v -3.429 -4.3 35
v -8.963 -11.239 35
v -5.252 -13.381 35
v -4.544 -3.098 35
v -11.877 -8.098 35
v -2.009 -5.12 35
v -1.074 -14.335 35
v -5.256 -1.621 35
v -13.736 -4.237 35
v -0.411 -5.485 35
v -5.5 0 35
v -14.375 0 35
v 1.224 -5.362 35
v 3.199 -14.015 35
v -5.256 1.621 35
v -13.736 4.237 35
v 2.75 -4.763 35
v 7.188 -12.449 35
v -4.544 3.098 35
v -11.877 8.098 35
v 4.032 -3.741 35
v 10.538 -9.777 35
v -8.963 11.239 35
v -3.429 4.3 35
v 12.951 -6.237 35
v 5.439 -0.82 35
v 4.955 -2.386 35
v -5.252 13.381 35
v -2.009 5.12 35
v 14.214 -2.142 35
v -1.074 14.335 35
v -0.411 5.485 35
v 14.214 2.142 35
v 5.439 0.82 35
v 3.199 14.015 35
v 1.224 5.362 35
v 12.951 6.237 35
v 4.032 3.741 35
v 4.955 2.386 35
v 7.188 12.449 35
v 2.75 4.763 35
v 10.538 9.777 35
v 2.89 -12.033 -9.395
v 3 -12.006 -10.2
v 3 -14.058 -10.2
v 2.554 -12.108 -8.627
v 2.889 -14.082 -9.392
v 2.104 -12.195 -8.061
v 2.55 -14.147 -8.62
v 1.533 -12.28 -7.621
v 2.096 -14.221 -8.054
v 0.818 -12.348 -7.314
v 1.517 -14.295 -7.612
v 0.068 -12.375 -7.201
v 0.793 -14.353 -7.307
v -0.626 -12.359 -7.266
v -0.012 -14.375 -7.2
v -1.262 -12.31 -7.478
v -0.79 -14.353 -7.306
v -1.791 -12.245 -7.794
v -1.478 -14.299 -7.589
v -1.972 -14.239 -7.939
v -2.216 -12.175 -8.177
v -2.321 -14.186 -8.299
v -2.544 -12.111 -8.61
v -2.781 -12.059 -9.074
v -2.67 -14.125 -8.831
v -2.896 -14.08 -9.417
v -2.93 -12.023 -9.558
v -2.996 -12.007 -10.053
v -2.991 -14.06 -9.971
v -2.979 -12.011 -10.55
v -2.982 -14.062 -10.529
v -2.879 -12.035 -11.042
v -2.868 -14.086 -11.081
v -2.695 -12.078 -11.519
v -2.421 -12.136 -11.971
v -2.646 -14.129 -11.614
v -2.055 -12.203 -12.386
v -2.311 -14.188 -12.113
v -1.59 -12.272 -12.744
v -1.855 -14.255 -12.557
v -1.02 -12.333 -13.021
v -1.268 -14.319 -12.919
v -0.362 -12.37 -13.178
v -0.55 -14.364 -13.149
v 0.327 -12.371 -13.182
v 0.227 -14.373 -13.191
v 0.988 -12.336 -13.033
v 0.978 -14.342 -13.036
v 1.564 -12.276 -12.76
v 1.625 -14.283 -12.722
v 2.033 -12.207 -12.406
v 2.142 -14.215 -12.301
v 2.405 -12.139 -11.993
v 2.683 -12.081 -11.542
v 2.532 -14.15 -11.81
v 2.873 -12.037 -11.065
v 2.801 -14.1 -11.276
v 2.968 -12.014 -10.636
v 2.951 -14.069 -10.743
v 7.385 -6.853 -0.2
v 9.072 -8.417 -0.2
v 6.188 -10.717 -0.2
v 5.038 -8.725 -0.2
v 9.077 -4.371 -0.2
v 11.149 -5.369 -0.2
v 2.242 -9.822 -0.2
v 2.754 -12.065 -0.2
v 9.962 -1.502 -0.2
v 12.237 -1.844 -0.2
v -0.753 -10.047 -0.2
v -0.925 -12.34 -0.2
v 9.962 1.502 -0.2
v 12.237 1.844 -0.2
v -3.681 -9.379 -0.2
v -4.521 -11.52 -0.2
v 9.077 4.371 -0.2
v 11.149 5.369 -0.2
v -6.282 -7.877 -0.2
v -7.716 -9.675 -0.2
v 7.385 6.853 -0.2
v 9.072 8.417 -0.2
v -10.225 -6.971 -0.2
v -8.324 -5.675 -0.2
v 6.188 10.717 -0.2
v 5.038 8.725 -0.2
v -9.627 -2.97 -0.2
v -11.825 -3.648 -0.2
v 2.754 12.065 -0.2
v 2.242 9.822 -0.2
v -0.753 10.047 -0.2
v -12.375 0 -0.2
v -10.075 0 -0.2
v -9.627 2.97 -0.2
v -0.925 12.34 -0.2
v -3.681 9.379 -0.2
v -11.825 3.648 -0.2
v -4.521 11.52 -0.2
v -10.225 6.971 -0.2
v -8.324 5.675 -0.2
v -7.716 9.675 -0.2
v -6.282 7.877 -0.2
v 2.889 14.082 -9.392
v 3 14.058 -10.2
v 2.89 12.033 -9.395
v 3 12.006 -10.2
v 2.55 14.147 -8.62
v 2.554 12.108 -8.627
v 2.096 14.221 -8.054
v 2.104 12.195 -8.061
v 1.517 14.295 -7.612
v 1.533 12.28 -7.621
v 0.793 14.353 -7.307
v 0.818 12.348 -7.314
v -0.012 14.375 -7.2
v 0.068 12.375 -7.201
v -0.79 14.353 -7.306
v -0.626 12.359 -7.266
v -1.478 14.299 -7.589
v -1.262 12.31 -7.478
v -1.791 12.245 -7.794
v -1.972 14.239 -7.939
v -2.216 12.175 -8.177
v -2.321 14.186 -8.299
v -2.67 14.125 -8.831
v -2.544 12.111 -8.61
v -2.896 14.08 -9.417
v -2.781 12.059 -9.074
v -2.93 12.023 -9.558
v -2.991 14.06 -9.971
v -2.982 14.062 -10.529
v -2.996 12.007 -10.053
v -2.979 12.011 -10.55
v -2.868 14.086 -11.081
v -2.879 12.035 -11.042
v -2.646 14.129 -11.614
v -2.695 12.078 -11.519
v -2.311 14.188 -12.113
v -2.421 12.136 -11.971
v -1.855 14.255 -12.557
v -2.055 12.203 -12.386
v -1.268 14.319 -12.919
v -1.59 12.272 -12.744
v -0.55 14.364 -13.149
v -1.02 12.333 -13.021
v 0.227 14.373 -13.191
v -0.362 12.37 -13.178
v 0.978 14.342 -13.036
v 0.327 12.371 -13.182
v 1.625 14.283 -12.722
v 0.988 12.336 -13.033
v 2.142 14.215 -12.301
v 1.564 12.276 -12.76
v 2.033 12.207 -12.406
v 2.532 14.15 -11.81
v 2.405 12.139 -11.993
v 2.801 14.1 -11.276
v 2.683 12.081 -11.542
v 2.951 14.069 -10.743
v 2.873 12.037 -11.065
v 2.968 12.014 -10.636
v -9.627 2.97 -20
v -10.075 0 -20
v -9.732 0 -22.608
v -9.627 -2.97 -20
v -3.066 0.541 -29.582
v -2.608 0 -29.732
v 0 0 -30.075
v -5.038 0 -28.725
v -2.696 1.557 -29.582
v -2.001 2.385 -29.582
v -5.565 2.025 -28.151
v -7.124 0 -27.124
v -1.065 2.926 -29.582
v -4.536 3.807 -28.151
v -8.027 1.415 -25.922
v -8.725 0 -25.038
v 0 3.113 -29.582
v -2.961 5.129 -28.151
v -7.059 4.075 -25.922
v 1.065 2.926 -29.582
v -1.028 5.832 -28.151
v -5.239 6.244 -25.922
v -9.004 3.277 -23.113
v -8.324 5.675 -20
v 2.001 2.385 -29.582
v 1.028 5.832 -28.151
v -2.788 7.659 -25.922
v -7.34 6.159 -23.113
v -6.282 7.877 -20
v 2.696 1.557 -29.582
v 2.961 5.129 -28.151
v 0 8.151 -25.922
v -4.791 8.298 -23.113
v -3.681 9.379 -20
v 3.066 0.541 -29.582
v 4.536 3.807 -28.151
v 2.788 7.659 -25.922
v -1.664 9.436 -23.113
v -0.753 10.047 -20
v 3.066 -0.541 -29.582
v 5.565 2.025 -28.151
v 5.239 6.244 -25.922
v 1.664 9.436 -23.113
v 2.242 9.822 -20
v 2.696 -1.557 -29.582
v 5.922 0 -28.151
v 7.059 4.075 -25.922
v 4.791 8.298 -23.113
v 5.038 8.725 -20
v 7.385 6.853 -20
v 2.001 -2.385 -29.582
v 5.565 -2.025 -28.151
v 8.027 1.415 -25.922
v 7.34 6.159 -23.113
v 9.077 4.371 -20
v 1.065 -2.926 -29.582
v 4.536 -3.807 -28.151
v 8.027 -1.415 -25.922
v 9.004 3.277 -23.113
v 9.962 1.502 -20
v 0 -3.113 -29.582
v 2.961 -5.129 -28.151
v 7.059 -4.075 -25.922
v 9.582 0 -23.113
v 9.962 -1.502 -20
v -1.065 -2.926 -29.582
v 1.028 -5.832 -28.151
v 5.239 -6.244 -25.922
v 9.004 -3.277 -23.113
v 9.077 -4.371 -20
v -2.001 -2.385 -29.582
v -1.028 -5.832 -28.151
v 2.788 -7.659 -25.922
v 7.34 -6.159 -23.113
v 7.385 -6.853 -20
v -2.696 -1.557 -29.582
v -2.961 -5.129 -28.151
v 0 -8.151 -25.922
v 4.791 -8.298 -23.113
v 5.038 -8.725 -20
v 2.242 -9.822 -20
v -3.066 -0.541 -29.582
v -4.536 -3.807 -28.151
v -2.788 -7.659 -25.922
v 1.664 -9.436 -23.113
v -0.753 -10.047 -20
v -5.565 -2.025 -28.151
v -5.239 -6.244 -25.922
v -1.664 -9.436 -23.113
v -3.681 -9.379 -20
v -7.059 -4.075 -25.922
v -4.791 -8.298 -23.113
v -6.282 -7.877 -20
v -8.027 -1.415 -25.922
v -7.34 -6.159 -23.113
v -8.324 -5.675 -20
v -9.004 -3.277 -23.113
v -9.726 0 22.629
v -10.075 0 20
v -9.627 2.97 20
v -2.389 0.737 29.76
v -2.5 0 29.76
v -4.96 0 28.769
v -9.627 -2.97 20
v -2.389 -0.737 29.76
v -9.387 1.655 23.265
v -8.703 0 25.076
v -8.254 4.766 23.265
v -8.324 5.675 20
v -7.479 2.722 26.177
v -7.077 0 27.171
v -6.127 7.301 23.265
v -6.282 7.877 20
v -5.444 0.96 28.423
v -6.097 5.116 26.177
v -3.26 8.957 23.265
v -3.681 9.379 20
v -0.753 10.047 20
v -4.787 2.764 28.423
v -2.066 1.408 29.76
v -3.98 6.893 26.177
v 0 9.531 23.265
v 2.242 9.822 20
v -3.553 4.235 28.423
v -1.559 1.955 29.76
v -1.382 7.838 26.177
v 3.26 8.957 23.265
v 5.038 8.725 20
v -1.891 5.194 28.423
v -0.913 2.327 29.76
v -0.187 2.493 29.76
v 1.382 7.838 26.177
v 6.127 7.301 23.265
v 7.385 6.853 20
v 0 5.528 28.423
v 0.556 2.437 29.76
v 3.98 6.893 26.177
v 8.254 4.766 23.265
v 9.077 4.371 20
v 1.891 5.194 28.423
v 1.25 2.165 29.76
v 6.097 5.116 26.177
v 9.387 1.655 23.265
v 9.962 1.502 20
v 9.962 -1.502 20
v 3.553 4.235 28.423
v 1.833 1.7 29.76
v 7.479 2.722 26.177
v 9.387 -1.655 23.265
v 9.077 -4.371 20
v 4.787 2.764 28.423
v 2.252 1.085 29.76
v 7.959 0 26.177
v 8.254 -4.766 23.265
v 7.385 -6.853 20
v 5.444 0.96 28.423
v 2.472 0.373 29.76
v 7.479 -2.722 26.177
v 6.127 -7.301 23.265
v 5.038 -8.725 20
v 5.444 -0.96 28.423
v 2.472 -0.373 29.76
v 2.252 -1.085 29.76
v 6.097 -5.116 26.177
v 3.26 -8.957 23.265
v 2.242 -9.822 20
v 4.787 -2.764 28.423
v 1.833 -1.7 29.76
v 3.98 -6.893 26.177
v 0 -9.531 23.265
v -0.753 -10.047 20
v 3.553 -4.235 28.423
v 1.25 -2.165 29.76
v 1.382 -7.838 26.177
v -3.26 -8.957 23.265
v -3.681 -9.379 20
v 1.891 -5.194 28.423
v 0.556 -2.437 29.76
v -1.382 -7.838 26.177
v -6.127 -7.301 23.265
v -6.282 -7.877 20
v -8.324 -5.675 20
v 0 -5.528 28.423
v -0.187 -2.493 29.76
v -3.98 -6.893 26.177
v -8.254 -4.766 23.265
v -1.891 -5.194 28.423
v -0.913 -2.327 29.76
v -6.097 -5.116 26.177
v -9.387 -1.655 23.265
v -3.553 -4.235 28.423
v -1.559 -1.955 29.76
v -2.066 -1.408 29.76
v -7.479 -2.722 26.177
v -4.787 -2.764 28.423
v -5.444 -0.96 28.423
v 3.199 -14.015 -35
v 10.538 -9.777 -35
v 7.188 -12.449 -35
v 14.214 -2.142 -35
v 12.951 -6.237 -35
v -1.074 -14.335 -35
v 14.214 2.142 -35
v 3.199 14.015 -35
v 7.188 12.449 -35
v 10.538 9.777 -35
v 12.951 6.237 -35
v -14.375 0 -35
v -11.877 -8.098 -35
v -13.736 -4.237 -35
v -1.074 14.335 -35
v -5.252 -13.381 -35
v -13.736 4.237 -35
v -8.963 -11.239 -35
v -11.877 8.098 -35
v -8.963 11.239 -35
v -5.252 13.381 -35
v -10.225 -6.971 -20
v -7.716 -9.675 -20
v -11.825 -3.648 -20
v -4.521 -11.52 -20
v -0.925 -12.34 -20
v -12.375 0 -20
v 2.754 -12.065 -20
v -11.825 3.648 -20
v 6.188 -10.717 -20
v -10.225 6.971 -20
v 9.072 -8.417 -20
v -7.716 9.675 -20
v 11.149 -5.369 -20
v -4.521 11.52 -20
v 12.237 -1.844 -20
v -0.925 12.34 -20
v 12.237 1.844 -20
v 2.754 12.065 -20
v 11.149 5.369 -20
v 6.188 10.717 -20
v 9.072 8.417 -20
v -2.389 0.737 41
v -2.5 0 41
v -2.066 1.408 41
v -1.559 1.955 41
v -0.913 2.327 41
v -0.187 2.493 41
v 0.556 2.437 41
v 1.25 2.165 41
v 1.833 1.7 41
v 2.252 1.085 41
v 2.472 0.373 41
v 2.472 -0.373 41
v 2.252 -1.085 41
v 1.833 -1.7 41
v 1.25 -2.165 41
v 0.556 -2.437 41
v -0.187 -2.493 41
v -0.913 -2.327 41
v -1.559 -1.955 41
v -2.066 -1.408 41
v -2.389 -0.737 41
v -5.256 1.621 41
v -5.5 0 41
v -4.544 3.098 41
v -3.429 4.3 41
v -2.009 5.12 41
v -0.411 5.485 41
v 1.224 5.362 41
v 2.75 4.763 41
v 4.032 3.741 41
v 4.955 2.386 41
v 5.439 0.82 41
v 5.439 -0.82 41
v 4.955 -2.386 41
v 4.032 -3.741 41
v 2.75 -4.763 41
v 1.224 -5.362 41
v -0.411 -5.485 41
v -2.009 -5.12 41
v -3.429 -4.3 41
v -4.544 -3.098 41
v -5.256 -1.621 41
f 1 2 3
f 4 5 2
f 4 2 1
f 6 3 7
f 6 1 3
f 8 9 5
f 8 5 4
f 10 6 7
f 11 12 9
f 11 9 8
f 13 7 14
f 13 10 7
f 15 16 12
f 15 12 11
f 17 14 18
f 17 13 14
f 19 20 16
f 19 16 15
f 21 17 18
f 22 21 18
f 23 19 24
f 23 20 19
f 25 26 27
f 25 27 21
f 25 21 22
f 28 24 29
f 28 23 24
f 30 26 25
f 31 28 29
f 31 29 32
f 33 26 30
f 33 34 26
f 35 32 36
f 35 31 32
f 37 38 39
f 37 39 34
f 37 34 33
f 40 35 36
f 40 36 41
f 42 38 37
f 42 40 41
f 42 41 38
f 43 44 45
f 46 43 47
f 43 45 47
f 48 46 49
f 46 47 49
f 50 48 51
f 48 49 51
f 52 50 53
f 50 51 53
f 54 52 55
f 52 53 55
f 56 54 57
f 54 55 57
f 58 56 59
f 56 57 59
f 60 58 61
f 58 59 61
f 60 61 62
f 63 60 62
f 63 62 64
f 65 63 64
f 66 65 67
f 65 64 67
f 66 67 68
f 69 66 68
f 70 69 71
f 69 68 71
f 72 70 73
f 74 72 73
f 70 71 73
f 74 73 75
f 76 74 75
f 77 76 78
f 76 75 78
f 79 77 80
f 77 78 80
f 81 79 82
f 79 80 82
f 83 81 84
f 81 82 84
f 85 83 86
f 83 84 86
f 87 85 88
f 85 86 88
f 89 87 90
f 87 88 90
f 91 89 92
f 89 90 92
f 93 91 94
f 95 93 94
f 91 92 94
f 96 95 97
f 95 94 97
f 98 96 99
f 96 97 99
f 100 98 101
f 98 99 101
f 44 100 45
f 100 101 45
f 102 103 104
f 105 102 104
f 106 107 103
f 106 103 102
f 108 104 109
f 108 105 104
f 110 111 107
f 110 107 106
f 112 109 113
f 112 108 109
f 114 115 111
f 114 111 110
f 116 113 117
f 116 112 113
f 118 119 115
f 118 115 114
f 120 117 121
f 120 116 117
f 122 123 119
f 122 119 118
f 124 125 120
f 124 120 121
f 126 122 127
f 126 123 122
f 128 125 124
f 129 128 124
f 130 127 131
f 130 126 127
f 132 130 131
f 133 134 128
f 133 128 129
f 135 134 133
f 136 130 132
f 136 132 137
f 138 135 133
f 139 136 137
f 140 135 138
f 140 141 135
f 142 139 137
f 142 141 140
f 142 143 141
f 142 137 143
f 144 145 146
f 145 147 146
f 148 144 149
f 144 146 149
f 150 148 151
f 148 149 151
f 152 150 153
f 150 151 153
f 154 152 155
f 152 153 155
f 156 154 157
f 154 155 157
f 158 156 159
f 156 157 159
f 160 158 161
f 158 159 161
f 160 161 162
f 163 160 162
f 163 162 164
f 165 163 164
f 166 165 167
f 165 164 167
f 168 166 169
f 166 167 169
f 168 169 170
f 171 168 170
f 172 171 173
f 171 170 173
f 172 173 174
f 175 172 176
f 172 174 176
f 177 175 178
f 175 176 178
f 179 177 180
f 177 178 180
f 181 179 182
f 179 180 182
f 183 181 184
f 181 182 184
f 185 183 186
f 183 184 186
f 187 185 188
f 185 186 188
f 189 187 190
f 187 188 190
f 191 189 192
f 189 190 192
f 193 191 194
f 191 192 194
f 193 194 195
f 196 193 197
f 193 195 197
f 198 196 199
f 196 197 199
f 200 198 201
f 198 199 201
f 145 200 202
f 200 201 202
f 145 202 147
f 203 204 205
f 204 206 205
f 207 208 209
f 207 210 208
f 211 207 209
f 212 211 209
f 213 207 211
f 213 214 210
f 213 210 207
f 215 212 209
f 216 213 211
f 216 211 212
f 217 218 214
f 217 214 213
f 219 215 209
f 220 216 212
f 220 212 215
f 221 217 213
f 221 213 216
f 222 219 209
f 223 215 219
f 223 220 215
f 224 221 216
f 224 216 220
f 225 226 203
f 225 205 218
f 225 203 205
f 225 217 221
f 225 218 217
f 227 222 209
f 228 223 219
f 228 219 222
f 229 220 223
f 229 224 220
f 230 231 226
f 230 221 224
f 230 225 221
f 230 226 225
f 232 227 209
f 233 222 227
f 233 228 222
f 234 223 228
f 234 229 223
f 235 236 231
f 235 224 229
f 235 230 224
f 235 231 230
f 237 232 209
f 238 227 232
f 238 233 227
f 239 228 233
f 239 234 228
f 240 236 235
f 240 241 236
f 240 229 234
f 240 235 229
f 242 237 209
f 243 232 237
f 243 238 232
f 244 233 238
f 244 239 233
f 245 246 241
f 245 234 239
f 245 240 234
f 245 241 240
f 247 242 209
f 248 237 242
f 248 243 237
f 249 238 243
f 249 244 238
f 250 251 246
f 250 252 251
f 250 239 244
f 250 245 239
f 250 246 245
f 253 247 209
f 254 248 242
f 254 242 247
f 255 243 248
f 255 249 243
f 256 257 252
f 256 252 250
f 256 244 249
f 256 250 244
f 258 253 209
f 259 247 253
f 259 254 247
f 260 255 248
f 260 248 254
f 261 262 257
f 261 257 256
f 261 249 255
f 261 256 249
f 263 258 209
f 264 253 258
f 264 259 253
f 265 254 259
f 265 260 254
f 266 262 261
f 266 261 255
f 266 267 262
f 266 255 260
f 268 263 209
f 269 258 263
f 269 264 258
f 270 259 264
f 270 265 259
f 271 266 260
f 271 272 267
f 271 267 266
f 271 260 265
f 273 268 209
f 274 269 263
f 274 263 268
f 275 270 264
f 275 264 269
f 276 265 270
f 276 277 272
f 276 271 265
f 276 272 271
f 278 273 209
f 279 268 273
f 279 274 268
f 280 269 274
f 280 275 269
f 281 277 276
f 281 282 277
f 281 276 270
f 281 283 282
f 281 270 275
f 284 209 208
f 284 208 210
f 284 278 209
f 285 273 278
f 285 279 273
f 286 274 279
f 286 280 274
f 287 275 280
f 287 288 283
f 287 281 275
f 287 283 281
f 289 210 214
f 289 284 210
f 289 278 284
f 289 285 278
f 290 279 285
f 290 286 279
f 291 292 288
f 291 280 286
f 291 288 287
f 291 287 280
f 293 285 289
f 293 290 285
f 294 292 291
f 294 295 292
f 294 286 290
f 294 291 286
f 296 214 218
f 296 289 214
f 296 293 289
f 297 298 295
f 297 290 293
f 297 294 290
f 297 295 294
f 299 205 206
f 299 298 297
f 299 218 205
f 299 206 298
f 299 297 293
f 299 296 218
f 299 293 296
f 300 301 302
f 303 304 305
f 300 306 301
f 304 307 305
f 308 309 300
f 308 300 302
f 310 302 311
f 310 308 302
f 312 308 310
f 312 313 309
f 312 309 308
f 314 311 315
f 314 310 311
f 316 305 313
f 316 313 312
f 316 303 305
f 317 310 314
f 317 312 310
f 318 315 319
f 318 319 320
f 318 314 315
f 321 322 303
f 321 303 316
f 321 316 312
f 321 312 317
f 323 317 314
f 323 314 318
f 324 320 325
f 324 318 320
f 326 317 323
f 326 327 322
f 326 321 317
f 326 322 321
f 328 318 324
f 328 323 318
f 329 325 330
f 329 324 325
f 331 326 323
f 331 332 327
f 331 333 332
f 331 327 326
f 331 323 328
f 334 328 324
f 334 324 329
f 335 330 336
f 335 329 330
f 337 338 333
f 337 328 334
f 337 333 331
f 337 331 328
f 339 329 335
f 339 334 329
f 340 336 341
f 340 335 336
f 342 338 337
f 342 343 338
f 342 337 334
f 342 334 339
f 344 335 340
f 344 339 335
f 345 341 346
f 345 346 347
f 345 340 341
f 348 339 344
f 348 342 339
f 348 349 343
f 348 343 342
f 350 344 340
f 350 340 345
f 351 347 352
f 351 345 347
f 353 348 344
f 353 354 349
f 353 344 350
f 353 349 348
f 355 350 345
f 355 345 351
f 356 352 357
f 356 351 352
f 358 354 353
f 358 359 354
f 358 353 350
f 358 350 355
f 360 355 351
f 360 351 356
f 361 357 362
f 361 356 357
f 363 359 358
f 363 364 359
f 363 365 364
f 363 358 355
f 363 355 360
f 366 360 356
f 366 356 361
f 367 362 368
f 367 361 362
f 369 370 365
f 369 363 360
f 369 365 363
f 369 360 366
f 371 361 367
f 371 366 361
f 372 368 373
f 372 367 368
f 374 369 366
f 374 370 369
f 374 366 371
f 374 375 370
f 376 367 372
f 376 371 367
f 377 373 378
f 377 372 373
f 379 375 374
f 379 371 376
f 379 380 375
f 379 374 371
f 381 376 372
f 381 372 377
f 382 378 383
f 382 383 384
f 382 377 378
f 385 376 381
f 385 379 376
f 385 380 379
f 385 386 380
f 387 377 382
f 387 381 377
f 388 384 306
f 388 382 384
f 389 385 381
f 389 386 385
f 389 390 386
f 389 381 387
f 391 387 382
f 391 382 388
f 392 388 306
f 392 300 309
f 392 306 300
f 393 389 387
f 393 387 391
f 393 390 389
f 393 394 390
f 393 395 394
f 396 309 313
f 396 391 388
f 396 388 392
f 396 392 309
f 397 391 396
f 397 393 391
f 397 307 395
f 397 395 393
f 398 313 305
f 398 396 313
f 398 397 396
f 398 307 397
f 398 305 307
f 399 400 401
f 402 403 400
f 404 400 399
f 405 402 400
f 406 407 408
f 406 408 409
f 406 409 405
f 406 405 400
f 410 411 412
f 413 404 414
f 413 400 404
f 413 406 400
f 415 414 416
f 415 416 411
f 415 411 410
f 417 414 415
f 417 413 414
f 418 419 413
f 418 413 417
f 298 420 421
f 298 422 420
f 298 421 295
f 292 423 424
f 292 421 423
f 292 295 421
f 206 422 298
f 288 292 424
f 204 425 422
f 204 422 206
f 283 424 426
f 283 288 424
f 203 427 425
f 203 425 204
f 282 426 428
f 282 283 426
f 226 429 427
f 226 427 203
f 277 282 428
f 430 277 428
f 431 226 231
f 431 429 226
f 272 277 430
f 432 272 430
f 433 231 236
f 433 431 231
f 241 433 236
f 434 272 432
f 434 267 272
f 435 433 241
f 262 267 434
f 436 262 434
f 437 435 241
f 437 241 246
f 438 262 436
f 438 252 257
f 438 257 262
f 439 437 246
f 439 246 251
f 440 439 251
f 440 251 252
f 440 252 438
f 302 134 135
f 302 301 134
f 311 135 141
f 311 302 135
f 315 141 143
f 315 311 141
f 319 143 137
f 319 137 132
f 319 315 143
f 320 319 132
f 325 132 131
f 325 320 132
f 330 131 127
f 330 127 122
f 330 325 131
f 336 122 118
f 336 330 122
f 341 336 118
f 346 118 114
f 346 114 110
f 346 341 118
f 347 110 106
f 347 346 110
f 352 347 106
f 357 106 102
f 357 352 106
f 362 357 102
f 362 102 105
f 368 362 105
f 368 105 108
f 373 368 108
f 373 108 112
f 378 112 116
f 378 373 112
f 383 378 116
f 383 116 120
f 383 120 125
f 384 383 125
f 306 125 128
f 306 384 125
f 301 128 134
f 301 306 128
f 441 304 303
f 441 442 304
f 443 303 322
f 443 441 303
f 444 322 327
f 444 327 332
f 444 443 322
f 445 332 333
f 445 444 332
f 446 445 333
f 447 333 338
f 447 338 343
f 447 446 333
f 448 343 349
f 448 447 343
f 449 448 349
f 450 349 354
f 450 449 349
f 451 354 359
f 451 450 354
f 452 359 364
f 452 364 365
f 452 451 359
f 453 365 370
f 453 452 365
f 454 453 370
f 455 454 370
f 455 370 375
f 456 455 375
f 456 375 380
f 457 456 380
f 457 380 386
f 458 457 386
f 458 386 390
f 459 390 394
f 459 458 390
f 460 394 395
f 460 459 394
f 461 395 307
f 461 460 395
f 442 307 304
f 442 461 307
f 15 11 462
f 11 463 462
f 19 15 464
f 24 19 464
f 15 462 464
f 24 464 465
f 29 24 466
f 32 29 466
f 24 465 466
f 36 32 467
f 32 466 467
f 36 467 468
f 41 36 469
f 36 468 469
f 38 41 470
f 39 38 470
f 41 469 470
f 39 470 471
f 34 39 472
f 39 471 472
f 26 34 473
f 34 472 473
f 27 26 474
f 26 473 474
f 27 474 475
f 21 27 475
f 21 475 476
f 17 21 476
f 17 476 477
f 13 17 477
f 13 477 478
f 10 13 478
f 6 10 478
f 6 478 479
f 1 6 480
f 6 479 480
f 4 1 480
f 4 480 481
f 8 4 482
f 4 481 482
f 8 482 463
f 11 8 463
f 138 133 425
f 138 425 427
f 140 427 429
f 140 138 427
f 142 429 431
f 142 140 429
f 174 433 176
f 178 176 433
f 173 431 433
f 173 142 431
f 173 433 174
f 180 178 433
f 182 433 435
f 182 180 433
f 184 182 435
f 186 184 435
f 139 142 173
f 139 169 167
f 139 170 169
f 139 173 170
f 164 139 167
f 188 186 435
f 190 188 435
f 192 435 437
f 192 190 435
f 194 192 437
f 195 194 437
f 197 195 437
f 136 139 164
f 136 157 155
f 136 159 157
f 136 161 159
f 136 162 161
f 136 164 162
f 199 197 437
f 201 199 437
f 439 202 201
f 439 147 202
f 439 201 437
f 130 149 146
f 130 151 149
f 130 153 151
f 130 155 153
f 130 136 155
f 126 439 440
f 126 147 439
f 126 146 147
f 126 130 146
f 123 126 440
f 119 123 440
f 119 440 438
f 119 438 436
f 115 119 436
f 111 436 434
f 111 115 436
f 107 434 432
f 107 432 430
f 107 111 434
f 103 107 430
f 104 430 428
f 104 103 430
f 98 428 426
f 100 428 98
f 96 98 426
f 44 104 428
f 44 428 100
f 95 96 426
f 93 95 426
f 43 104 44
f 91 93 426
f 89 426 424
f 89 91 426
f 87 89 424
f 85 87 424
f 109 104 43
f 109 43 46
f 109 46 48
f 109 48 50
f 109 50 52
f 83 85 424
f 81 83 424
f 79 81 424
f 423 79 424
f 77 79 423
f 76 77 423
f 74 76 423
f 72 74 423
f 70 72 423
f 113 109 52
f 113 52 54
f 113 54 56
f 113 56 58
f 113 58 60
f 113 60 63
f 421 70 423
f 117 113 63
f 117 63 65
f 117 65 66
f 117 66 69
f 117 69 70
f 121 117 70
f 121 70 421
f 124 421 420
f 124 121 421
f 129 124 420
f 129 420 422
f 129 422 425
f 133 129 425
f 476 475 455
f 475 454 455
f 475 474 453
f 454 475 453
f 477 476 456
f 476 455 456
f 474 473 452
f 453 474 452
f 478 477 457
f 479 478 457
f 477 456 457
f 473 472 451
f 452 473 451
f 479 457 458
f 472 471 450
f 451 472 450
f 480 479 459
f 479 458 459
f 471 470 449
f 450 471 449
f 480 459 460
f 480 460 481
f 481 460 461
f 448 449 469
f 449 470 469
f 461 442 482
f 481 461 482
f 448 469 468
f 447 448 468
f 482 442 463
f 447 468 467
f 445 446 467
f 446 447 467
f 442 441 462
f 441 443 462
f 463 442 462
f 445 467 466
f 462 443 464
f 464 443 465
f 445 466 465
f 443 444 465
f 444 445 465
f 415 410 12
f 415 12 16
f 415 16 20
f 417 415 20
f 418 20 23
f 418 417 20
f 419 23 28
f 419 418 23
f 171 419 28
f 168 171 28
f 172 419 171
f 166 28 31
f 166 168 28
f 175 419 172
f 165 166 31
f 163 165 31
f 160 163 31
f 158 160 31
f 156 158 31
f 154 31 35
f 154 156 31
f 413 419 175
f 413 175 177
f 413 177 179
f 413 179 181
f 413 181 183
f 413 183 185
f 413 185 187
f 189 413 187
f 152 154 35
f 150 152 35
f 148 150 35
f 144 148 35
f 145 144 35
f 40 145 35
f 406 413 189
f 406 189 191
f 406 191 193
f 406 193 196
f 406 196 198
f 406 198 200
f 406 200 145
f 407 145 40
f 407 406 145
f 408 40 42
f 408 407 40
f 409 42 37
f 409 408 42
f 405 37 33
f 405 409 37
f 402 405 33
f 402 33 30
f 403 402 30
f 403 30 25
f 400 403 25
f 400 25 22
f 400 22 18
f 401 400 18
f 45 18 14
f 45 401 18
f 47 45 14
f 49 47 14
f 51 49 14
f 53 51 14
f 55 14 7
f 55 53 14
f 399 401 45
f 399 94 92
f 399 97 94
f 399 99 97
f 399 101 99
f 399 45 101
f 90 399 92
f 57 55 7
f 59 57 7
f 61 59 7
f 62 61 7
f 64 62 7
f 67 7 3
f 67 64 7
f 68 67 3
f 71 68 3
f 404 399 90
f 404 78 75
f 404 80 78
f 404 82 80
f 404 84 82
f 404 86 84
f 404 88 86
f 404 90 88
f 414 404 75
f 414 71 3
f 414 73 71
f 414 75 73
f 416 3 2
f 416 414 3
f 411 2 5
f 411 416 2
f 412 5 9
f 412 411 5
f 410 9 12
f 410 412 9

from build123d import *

# Parameters (mm, degrees)
F0_W     = 3
F0_H     = 6
F2_R     = 3
F3_DEPTH = 15


# Not quite as in the source:
# - a feature names something its author has since deleted; it is built from what else it names


with BuildPart() as f1:
    # F0 (on Front) → F1 (revolve)
    with BuildSketch(Plane.XZ):
        with BuildLine():
            Line((-5.5, 35), (-14.375, 35))
            Line((-14.375, 35), (-14.375, -35))
            Line((-14.375, -35), (0, -35))
            Line((0, -35), (0, -30.075))
            ThreePointArc((0, -30.075), (-7.1241008205, -27.1241008205), (-10.075, -20))
            Line((-10.075, -20), (-12.375, -20))
            Line((-12.375, -20), (-12.375, -0.2))
            Line((-12.375, -0.2), (-10.075, -0.2))
            Line((-10.075, -0.2), (-10.075, 20))
            ThreePointArc((-10.075, 20), (-7.9590553774, 26.1773022024), (-2.5, 29.7598988212))
            Line((-2.5, 29.7598988212), (-2.5, 35))
            Line((-2.5, 35), (-5.5, 35))
        make_face()
        with Locations((-4, 38)):
            Rectangle(F0_W, F0_H)
    revolve(axis=Axis((0, 0, 0), (0, 0, -1)))

    # F2 (on Front) → F3 (cut, symmetric)
    with BuildSketch(Plane.XZ):
        with Locations((0, -10.2)):
            Circle(F2_R)
    extrude(amount=F3_DEPTH, both=True, mode=Mode.SUBTRACT)


solid = f1.part
